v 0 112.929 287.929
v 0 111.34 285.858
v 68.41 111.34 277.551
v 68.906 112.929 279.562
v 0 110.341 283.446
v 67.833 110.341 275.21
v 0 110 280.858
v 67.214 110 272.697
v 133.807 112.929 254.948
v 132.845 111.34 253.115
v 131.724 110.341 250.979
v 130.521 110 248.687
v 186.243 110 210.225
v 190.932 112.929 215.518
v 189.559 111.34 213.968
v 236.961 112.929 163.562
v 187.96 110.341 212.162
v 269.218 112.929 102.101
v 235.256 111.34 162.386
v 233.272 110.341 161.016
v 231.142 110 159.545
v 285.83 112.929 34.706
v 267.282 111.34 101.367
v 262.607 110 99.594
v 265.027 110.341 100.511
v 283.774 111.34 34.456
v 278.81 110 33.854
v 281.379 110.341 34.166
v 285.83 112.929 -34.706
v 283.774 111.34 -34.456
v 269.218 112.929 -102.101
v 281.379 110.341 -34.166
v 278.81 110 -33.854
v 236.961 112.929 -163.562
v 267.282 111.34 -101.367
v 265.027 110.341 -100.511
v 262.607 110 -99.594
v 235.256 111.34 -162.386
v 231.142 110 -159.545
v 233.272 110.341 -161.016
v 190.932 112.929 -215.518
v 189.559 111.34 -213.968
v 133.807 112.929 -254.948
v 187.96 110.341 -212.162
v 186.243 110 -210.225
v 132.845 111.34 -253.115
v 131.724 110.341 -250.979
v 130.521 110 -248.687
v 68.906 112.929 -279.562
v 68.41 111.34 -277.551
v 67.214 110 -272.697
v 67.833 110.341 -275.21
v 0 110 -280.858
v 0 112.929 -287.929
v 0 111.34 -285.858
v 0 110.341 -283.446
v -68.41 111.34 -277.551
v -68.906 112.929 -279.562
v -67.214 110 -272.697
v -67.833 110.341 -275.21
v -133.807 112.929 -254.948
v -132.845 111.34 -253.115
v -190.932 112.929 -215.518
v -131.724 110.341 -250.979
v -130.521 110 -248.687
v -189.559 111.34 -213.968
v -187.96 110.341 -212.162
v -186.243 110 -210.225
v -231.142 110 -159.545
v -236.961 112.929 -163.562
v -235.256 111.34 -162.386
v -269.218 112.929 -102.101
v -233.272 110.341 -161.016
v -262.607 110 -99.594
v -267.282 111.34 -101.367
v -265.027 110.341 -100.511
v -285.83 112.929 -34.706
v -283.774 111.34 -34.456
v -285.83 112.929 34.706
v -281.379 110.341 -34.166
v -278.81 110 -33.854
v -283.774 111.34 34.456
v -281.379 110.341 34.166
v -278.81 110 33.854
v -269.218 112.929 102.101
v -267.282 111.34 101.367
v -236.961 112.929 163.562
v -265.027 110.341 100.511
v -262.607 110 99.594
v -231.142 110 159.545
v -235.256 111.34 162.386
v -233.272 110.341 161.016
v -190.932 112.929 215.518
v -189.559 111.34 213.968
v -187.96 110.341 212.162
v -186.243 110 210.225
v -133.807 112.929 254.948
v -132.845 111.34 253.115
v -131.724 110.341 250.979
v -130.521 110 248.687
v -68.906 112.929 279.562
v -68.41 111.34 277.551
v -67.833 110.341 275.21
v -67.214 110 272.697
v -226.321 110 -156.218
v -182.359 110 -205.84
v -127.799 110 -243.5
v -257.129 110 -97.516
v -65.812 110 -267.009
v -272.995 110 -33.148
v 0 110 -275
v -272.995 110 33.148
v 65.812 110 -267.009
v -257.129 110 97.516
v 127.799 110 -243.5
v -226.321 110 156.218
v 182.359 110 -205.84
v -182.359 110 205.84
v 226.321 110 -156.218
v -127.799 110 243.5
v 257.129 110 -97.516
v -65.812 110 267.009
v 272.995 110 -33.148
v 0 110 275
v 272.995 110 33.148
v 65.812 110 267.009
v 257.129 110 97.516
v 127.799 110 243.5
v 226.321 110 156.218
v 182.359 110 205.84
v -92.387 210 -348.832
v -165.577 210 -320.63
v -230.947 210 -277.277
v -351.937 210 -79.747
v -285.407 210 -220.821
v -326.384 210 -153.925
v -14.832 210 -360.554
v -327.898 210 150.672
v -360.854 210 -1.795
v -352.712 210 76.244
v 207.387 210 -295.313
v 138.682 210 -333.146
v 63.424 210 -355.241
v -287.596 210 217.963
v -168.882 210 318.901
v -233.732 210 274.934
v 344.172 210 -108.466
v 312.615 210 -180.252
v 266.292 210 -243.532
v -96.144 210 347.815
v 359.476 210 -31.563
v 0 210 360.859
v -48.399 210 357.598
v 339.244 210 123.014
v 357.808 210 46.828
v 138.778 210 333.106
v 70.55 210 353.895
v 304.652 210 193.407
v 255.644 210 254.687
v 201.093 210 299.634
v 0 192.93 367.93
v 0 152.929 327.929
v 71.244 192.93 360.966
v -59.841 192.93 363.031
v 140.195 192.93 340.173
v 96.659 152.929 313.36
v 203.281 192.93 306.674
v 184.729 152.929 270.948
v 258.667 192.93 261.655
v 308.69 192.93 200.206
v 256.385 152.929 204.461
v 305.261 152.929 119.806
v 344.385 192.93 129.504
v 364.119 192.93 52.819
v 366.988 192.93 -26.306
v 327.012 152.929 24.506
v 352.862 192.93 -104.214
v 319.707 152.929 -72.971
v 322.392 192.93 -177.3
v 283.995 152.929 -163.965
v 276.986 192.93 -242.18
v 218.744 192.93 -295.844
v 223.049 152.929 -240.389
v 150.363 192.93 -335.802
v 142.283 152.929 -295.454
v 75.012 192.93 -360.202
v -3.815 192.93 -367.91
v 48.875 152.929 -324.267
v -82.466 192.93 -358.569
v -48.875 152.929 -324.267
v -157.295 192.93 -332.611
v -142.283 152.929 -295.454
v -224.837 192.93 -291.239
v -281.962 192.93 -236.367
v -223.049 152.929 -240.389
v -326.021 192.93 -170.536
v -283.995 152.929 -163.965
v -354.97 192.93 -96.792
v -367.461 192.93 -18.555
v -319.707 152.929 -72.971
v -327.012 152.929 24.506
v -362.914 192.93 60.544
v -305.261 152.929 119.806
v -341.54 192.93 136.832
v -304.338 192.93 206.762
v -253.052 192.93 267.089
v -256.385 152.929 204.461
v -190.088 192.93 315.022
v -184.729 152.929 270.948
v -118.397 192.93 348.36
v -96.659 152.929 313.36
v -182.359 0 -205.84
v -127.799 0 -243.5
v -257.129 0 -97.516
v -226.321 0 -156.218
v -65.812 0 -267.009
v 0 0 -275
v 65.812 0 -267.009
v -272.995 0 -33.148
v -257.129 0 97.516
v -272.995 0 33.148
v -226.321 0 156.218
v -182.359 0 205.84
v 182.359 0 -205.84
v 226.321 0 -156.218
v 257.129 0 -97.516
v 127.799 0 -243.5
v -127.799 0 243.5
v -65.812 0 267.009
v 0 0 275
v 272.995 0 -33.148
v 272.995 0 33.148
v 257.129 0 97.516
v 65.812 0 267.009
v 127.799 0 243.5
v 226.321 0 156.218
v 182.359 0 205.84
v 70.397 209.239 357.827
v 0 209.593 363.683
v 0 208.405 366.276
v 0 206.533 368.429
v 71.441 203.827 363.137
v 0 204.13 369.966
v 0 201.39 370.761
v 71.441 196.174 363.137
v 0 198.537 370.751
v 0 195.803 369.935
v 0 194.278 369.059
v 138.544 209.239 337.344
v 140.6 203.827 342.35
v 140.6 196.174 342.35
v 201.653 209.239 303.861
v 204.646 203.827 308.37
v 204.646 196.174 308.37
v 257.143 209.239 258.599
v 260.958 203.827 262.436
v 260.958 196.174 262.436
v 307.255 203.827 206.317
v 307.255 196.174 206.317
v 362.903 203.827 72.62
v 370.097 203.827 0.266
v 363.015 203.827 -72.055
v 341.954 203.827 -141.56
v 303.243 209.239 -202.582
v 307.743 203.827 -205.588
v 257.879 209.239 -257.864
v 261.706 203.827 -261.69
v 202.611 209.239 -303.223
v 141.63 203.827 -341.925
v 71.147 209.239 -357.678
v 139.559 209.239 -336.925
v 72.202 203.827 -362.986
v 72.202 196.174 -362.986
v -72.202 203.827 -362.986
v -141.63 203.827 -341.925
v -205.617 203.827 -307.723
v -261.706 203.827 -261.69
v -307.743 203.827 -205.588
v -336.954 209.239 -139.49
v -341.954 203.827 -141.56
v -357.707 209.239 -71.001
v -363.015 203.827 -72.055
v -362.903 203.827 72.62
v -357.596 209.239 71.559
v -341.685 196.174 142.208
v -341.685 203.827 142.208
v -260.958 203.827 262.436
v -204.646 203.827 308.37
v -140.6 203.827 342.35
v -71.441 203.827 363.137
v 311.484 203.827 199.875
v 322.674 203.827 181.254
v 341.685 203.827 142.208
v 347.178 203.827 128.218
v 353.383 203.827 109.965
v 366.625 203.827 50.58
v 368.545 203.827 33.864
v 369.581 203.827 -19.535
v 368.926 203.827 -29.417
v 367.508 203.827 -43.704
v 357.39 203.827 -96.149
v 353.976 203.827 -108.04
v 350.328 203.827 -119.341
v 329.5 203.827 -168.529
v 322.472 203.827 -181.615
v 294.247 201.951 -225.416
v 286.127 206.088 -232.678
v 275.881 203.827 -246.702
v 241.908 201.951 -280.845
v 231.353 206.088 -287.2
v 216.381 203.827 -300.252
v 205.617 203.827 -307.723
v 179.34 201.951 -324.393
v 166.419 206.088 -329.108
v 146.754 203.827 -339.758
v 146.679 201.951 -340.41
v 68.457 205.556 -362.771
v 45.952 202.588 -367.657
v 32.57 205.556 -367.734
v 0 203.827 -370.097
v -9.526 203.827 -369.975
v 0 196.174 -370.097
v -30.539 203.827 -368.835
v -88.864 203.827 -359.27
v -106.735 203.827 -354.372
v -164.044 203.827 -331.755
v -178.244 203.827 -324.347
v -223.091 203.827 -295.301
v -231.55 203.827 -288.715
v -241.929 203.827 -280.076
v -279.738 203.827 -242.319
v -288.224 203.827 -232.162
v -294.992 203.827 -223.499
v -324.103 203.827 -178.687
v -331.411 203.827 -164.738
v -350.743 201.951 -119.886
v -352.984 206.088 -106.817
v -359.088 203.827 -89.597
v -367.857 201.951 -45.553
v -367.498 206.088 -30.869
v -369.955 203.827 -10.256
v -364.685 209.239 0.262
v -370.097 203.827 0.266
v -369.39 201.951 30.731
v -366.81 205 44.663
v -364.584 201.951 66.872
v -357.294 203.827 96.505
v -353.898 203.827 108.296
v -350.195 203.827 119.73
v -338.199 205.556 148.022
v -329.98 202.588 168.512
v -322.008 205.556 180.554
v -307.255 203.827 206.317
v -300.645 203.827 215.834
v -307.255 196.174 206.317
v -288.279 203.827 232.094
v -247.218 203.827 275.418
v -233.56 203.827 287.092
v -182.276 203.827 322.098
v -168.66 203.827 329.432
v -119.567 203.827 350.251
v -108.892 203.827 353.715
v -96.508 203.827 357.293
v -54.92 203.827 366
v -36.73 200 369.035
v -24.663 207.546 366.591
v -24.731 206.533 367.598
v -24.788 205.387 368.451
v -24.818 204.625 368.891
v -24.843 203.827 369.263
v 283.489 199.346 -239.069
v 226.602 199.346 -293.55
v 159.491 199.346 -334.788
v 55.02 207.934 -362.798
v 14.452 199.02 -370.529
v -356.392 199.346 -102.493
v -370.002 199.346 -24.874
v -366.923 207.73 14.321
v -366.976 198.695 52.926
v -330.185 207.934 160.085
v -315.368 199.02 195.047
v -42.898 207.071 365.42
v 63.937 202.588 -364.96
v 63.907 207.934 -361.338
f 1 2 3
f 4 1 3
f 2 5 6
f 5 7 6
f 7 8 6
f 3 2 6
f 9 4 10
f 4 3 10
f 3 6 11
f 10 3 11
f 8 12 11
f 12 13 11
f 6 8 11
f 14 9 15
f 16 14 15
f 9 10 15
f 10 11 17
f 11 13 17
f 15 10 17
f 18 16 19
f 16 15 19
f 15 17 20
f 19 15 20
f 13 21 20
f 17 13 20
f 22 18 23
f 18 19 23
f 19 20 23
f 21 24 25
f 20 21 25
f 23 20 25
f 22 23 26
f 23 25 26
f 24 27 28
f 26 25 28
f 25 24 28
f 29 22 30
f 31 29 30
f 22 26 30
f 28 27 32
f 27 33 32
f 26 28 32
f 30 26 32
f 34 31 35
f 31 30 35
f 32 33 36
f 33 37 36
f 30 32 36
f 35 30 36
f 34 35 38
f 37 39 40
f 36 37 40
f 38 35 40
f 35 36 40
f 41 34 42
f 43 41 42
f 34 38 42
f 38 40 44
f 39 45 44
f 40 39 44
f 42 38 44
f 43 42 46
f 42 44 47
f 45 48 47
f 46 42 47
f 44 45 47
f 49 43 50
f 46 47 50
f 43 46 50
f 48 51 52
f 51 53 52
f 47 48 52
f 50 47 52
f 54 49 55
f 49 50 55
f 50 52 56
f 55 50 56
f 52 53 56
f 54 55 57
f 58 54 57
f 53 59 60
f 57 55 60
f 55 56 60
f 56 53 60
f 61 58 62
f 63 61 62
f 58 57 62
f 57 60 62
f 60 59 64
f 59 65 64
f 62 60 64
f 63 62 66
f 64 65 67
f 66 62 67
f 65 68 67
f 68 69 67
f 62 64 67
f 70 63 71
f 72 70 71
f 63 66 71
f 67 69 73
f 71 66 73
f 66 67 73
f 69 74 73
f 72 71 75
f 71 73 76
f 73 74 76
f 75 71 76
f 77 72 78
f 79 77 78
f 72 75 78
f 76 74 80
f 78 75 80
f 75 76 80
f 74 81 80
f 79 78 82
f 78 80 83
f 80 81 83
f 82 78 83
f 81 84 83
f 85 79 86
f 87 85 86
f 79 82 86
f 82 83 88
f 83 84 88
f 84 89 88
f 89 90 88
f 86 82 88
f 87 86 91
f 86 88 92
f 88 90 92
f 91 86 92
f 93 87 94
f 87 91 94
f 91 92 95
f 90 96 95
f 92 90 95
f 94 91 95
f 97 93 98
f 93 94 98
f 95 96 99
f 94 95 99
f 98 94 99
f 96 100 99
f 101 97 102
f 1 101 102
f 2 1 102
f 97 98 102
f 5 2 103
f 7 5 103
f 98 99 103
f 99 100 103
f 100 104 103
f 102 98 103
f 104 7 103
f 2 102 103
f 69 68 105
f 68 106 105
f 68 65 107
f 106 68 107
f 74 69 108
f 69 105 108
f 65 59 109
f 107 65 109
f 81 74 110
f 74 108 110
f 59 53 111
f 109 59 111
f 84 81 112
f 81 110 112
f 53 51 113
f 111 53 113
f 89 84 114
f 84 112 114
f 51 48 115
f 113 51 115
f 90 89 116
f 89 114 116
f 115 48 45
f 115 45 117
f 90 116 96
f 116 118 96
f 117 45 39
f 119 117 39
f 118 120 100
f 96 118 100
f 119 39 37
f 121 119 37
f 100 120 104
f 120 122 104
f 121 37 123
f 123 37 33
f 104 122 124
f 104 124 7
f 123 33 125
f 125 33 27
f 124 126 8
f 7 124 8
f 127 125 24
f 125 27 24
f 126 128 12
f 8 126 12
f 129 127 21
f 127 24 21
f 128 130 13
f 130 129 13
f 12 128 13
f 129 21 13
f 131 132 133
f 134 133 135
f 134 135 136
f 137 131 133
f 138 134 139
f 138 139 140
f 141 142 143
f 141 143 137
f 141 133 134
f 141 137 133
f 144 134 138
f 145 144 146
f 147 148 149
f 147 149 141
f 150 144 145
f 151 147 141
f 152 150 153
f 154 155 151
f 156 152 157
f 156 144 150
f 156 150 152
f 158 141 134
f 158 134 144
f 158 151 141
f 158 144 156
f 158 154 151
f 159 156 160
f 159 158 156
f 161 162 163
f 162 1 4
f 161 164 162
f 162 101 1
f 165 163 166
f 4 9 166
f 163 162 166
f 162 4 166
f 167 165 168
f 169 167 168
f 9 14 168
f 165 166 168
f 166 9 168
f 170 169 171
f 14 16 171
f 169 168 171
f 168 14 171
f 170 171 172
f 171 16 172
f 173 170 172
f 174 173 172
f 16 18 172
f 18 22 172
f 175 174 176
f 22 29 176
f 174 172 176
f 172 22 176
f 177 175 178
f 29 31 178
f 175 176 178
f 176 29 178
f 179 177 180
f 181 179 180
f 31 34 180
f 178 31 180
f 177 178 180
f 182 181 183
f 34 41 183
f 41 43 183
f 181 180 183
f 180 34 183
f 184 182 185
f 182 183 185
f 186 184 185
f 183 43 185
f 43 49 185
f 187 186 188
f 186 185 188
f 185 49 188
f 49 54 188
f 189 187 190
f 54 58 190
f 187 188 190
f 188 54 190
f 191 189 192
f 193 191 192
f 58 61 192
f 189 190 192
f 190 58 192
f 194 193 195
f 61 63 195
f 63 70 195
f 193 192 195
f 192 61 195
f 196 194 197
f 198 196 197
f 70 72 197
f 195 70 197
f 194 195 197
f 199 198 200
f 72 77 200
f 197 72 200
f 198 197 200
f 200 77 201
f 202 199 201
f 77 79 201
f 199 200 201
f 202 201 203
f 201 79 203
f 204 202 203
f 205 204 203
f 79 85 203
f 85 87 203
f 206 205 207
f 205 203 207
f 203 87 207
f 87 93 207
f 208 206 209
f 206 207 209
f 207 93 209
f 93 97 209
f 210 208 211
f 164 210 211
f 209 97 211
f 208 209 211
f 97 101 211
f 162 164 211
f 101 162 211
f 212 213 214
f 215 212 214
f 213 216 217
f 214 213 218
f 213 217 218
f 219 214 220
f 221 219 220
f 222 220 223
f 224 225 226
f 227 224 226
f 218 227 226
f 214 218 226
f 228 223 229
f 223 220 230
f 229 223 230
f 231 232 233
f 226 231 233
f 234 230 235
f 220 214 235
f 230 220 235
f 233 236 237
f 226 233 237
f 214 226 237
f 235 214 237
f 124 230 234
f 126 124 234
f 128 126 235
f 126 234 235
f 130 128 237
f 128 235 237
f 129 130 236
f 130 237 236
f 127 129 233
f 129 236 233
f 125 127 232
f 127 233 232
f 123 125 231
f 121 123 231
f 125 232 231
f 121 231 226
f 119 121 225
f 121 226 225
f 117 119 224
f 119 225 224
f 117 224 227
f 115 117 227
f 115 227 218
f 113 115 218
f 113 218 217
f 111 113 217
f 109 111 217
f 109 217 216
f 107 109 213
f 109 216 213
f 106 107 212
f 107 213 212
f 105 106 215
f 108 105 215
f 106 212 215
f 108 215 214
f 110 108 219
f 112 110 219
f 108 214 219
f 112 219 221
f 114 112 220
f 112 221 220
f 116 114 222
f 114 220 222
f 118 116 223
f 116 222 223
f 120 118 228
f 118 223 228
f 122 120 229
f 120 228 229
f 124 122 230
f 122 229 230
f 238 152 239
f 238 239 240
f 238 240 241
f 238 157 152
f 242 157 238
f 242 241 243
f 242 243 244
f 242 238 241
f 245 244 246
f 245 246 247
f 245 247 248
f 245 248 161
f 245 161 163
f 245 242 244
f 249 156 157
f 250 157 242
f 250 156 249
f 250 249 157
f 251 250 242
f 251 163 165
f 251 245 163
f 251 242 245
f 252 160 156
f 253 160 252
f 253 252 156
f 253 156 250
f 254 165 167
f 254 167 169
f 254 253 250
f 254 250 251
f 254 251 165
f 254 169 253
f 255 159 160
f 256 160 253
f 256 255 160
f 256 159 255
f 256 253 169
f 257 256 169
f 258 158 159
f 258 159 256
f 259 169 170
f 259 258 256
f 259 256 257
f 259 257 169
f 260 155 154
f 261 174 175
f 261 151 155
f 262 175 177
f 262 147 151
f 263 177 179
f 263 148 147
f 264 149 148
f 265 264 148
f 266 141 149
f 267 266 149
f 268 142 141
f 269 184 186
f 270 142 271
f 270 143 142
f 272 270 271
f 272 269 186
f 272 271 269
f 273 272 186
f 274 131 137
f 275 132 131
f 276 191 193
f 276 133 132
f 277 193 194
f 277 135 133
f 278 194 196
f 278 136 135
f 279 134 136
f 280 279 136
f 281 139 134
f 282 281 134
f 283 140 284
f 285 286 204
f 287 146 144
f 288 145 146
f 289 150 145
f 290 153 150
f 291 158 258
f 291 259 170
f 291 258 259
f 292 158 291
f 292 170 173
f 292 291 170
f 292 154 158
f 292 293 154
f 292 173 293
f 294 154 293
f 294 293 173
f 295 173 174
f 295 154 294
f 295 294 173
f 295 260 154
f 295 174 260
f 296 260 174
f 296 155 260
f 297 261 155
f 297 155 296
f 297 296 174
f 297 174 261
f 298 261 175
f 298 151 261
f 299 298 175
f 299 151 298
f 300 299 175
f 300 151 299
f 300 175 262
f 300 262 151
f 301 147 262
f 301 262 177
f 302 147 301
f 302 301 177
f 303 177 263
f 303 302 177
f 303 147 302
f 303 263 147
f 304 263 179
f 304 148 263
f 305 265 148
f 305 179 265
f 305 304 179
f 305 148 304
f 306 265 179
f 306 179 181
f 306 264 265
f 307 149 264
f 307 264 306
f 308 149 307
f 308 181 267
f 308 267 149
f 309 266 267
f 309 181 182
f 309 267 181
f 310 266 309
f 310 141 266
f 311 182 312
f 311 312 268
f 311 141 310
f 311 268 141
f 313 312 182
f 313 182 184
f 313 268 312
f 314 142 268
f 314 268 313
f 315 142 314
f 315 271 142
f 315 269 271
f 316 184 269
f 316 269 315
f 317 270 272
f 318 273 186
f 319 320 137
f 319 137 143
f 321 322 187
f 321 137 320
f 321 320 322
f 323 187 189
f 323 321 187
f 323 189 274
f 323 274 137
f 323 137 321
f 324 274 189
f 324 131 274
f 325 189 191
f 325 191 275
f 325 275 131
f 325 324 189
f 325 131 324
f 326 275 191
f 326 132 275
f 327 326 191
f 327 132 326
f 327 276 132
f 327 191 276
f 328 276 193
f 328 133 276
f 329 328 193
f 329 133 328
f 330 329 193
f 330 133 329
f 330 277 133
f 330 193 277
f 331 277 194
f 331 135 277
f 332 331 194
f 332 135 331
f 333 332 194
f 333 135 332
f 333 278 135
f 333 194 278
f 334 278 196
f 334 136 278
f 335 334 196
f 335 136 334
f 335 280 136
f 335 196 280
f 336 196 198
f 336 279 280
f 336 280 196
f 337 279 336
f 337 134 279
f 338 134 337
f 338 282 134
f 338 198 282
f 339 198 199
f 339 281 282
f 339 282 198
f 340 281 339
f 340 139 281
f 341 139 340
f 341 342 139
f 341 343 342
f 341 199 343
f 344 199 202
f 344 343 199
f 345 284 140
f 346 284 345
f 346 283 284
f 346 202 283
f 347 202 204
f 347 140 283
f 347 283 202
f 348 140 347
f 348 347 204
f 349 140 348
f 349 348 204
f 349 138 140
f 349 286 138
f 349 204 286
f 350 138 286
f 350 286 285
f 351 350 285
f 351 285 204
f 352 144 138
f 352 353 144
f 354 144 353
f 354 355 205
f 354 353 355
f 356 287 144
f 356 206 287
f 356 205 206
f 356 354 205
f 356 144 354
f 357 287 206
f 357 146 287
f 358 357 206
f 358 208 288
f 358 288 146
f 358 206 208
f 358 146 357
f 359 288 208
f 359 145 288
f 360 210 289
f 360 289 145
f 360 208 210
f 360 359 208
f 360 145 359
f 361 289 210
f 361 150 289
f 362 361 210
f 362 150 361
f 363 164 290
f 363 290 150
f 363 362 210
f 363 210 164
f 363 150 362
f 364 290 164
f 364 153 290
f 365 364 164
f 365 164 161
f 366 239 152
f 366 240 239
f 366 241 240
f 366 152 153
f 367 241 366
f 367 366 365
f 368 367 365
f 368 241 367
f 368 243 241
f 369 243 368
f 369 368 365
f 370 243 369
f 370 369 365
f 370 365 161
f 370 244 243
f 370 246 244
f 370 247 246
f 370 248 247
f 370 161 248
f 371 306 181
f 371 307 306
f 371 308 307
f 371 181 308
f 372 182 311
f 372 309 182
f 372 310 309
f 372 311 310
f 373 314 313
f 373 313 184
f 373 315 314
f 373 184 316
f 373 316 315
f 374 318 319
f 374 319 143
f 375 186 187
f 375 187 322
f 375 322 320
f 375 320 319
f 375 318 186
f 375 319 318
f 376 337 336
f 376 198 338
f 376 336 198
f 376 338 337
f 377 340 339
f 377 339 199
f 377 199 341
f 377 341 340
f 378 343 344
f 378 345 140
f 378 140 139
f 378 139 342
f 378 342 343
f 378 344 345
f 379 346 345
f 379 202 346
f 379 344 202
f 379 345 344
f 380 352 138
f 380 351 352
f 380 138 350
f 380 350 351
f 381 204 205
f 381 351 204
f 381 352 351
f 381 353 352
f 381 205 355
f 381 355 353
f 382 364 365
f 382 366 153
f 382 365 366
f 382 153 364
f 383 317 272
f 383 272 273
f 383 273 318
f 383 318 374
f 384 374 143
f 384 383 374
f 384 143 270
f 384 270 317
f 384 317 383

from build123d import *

# Parameters (mm, degrees)
SKETCH1_R           = 275
BOSS_EXTRUDE1_DEPTH = 110
SKETCH2_R           = 375
BOSS_EXTRUDE2_DEPTH = 100
CHAMFER1_SIZE       = 90
FILLET1_R           = 10
FILLET2_R           = 10


with BuildPart() as part:
    # Sketch1 → Boss-Extrude1 (new body)
    with BuildSketch(Plane(origin=(0, 0, 0), x_dir=(1, 0, 0), z_dir=(0, 1, 0))):
        with Locations(Location((0, 0, 0), (0, 0, 270))):
            Circle(SKETCH1_R)
    extrude(amount=BOSS_EXTRUDE1_DEPTH)

    # Sketch2 → Boss-Extrude2 (add)
    with BuildSketch(Plane(origin=(0, 110, 0), x_dir=(1, 0, 0), z_dir=(0, 1, 0))):
        with Locations(Location((0, 0, 0), (0, 0, 270))):
            Circle(SKETCH2_R)
    extrude(amount=BOSS_EXTRUDE2_DEPTH)

    # Chamfer1
    chamfer1_edges = [part.edges().sort_by_distance(p)[0] for p in [
        (0, 110, -375),
    ]]
    chamfer(chamfer1_edges, length=CHAMFER1_SIZE)

    # Fillet1
    fillet1_edges = [part.edges().sort_by_distance(p)[0] for p in [
        (0, 110, -285),
        (0, 210, -375),
    ]]
    fillet(fillet1_edges, radius=FILLET1_R - 0.0001)  # a hair under: the kernel refuses the full size

    # Fillet2
    fillet2_edges = [part.edges().sort_by_distance(p)[0] for p in [
        (0, 200, -375),
    ]]
    fillet(fillet2_edges, radius=FILLET2_R - 0.0004)  # a hair under: the kernel refuses the full size


solid = part.part
